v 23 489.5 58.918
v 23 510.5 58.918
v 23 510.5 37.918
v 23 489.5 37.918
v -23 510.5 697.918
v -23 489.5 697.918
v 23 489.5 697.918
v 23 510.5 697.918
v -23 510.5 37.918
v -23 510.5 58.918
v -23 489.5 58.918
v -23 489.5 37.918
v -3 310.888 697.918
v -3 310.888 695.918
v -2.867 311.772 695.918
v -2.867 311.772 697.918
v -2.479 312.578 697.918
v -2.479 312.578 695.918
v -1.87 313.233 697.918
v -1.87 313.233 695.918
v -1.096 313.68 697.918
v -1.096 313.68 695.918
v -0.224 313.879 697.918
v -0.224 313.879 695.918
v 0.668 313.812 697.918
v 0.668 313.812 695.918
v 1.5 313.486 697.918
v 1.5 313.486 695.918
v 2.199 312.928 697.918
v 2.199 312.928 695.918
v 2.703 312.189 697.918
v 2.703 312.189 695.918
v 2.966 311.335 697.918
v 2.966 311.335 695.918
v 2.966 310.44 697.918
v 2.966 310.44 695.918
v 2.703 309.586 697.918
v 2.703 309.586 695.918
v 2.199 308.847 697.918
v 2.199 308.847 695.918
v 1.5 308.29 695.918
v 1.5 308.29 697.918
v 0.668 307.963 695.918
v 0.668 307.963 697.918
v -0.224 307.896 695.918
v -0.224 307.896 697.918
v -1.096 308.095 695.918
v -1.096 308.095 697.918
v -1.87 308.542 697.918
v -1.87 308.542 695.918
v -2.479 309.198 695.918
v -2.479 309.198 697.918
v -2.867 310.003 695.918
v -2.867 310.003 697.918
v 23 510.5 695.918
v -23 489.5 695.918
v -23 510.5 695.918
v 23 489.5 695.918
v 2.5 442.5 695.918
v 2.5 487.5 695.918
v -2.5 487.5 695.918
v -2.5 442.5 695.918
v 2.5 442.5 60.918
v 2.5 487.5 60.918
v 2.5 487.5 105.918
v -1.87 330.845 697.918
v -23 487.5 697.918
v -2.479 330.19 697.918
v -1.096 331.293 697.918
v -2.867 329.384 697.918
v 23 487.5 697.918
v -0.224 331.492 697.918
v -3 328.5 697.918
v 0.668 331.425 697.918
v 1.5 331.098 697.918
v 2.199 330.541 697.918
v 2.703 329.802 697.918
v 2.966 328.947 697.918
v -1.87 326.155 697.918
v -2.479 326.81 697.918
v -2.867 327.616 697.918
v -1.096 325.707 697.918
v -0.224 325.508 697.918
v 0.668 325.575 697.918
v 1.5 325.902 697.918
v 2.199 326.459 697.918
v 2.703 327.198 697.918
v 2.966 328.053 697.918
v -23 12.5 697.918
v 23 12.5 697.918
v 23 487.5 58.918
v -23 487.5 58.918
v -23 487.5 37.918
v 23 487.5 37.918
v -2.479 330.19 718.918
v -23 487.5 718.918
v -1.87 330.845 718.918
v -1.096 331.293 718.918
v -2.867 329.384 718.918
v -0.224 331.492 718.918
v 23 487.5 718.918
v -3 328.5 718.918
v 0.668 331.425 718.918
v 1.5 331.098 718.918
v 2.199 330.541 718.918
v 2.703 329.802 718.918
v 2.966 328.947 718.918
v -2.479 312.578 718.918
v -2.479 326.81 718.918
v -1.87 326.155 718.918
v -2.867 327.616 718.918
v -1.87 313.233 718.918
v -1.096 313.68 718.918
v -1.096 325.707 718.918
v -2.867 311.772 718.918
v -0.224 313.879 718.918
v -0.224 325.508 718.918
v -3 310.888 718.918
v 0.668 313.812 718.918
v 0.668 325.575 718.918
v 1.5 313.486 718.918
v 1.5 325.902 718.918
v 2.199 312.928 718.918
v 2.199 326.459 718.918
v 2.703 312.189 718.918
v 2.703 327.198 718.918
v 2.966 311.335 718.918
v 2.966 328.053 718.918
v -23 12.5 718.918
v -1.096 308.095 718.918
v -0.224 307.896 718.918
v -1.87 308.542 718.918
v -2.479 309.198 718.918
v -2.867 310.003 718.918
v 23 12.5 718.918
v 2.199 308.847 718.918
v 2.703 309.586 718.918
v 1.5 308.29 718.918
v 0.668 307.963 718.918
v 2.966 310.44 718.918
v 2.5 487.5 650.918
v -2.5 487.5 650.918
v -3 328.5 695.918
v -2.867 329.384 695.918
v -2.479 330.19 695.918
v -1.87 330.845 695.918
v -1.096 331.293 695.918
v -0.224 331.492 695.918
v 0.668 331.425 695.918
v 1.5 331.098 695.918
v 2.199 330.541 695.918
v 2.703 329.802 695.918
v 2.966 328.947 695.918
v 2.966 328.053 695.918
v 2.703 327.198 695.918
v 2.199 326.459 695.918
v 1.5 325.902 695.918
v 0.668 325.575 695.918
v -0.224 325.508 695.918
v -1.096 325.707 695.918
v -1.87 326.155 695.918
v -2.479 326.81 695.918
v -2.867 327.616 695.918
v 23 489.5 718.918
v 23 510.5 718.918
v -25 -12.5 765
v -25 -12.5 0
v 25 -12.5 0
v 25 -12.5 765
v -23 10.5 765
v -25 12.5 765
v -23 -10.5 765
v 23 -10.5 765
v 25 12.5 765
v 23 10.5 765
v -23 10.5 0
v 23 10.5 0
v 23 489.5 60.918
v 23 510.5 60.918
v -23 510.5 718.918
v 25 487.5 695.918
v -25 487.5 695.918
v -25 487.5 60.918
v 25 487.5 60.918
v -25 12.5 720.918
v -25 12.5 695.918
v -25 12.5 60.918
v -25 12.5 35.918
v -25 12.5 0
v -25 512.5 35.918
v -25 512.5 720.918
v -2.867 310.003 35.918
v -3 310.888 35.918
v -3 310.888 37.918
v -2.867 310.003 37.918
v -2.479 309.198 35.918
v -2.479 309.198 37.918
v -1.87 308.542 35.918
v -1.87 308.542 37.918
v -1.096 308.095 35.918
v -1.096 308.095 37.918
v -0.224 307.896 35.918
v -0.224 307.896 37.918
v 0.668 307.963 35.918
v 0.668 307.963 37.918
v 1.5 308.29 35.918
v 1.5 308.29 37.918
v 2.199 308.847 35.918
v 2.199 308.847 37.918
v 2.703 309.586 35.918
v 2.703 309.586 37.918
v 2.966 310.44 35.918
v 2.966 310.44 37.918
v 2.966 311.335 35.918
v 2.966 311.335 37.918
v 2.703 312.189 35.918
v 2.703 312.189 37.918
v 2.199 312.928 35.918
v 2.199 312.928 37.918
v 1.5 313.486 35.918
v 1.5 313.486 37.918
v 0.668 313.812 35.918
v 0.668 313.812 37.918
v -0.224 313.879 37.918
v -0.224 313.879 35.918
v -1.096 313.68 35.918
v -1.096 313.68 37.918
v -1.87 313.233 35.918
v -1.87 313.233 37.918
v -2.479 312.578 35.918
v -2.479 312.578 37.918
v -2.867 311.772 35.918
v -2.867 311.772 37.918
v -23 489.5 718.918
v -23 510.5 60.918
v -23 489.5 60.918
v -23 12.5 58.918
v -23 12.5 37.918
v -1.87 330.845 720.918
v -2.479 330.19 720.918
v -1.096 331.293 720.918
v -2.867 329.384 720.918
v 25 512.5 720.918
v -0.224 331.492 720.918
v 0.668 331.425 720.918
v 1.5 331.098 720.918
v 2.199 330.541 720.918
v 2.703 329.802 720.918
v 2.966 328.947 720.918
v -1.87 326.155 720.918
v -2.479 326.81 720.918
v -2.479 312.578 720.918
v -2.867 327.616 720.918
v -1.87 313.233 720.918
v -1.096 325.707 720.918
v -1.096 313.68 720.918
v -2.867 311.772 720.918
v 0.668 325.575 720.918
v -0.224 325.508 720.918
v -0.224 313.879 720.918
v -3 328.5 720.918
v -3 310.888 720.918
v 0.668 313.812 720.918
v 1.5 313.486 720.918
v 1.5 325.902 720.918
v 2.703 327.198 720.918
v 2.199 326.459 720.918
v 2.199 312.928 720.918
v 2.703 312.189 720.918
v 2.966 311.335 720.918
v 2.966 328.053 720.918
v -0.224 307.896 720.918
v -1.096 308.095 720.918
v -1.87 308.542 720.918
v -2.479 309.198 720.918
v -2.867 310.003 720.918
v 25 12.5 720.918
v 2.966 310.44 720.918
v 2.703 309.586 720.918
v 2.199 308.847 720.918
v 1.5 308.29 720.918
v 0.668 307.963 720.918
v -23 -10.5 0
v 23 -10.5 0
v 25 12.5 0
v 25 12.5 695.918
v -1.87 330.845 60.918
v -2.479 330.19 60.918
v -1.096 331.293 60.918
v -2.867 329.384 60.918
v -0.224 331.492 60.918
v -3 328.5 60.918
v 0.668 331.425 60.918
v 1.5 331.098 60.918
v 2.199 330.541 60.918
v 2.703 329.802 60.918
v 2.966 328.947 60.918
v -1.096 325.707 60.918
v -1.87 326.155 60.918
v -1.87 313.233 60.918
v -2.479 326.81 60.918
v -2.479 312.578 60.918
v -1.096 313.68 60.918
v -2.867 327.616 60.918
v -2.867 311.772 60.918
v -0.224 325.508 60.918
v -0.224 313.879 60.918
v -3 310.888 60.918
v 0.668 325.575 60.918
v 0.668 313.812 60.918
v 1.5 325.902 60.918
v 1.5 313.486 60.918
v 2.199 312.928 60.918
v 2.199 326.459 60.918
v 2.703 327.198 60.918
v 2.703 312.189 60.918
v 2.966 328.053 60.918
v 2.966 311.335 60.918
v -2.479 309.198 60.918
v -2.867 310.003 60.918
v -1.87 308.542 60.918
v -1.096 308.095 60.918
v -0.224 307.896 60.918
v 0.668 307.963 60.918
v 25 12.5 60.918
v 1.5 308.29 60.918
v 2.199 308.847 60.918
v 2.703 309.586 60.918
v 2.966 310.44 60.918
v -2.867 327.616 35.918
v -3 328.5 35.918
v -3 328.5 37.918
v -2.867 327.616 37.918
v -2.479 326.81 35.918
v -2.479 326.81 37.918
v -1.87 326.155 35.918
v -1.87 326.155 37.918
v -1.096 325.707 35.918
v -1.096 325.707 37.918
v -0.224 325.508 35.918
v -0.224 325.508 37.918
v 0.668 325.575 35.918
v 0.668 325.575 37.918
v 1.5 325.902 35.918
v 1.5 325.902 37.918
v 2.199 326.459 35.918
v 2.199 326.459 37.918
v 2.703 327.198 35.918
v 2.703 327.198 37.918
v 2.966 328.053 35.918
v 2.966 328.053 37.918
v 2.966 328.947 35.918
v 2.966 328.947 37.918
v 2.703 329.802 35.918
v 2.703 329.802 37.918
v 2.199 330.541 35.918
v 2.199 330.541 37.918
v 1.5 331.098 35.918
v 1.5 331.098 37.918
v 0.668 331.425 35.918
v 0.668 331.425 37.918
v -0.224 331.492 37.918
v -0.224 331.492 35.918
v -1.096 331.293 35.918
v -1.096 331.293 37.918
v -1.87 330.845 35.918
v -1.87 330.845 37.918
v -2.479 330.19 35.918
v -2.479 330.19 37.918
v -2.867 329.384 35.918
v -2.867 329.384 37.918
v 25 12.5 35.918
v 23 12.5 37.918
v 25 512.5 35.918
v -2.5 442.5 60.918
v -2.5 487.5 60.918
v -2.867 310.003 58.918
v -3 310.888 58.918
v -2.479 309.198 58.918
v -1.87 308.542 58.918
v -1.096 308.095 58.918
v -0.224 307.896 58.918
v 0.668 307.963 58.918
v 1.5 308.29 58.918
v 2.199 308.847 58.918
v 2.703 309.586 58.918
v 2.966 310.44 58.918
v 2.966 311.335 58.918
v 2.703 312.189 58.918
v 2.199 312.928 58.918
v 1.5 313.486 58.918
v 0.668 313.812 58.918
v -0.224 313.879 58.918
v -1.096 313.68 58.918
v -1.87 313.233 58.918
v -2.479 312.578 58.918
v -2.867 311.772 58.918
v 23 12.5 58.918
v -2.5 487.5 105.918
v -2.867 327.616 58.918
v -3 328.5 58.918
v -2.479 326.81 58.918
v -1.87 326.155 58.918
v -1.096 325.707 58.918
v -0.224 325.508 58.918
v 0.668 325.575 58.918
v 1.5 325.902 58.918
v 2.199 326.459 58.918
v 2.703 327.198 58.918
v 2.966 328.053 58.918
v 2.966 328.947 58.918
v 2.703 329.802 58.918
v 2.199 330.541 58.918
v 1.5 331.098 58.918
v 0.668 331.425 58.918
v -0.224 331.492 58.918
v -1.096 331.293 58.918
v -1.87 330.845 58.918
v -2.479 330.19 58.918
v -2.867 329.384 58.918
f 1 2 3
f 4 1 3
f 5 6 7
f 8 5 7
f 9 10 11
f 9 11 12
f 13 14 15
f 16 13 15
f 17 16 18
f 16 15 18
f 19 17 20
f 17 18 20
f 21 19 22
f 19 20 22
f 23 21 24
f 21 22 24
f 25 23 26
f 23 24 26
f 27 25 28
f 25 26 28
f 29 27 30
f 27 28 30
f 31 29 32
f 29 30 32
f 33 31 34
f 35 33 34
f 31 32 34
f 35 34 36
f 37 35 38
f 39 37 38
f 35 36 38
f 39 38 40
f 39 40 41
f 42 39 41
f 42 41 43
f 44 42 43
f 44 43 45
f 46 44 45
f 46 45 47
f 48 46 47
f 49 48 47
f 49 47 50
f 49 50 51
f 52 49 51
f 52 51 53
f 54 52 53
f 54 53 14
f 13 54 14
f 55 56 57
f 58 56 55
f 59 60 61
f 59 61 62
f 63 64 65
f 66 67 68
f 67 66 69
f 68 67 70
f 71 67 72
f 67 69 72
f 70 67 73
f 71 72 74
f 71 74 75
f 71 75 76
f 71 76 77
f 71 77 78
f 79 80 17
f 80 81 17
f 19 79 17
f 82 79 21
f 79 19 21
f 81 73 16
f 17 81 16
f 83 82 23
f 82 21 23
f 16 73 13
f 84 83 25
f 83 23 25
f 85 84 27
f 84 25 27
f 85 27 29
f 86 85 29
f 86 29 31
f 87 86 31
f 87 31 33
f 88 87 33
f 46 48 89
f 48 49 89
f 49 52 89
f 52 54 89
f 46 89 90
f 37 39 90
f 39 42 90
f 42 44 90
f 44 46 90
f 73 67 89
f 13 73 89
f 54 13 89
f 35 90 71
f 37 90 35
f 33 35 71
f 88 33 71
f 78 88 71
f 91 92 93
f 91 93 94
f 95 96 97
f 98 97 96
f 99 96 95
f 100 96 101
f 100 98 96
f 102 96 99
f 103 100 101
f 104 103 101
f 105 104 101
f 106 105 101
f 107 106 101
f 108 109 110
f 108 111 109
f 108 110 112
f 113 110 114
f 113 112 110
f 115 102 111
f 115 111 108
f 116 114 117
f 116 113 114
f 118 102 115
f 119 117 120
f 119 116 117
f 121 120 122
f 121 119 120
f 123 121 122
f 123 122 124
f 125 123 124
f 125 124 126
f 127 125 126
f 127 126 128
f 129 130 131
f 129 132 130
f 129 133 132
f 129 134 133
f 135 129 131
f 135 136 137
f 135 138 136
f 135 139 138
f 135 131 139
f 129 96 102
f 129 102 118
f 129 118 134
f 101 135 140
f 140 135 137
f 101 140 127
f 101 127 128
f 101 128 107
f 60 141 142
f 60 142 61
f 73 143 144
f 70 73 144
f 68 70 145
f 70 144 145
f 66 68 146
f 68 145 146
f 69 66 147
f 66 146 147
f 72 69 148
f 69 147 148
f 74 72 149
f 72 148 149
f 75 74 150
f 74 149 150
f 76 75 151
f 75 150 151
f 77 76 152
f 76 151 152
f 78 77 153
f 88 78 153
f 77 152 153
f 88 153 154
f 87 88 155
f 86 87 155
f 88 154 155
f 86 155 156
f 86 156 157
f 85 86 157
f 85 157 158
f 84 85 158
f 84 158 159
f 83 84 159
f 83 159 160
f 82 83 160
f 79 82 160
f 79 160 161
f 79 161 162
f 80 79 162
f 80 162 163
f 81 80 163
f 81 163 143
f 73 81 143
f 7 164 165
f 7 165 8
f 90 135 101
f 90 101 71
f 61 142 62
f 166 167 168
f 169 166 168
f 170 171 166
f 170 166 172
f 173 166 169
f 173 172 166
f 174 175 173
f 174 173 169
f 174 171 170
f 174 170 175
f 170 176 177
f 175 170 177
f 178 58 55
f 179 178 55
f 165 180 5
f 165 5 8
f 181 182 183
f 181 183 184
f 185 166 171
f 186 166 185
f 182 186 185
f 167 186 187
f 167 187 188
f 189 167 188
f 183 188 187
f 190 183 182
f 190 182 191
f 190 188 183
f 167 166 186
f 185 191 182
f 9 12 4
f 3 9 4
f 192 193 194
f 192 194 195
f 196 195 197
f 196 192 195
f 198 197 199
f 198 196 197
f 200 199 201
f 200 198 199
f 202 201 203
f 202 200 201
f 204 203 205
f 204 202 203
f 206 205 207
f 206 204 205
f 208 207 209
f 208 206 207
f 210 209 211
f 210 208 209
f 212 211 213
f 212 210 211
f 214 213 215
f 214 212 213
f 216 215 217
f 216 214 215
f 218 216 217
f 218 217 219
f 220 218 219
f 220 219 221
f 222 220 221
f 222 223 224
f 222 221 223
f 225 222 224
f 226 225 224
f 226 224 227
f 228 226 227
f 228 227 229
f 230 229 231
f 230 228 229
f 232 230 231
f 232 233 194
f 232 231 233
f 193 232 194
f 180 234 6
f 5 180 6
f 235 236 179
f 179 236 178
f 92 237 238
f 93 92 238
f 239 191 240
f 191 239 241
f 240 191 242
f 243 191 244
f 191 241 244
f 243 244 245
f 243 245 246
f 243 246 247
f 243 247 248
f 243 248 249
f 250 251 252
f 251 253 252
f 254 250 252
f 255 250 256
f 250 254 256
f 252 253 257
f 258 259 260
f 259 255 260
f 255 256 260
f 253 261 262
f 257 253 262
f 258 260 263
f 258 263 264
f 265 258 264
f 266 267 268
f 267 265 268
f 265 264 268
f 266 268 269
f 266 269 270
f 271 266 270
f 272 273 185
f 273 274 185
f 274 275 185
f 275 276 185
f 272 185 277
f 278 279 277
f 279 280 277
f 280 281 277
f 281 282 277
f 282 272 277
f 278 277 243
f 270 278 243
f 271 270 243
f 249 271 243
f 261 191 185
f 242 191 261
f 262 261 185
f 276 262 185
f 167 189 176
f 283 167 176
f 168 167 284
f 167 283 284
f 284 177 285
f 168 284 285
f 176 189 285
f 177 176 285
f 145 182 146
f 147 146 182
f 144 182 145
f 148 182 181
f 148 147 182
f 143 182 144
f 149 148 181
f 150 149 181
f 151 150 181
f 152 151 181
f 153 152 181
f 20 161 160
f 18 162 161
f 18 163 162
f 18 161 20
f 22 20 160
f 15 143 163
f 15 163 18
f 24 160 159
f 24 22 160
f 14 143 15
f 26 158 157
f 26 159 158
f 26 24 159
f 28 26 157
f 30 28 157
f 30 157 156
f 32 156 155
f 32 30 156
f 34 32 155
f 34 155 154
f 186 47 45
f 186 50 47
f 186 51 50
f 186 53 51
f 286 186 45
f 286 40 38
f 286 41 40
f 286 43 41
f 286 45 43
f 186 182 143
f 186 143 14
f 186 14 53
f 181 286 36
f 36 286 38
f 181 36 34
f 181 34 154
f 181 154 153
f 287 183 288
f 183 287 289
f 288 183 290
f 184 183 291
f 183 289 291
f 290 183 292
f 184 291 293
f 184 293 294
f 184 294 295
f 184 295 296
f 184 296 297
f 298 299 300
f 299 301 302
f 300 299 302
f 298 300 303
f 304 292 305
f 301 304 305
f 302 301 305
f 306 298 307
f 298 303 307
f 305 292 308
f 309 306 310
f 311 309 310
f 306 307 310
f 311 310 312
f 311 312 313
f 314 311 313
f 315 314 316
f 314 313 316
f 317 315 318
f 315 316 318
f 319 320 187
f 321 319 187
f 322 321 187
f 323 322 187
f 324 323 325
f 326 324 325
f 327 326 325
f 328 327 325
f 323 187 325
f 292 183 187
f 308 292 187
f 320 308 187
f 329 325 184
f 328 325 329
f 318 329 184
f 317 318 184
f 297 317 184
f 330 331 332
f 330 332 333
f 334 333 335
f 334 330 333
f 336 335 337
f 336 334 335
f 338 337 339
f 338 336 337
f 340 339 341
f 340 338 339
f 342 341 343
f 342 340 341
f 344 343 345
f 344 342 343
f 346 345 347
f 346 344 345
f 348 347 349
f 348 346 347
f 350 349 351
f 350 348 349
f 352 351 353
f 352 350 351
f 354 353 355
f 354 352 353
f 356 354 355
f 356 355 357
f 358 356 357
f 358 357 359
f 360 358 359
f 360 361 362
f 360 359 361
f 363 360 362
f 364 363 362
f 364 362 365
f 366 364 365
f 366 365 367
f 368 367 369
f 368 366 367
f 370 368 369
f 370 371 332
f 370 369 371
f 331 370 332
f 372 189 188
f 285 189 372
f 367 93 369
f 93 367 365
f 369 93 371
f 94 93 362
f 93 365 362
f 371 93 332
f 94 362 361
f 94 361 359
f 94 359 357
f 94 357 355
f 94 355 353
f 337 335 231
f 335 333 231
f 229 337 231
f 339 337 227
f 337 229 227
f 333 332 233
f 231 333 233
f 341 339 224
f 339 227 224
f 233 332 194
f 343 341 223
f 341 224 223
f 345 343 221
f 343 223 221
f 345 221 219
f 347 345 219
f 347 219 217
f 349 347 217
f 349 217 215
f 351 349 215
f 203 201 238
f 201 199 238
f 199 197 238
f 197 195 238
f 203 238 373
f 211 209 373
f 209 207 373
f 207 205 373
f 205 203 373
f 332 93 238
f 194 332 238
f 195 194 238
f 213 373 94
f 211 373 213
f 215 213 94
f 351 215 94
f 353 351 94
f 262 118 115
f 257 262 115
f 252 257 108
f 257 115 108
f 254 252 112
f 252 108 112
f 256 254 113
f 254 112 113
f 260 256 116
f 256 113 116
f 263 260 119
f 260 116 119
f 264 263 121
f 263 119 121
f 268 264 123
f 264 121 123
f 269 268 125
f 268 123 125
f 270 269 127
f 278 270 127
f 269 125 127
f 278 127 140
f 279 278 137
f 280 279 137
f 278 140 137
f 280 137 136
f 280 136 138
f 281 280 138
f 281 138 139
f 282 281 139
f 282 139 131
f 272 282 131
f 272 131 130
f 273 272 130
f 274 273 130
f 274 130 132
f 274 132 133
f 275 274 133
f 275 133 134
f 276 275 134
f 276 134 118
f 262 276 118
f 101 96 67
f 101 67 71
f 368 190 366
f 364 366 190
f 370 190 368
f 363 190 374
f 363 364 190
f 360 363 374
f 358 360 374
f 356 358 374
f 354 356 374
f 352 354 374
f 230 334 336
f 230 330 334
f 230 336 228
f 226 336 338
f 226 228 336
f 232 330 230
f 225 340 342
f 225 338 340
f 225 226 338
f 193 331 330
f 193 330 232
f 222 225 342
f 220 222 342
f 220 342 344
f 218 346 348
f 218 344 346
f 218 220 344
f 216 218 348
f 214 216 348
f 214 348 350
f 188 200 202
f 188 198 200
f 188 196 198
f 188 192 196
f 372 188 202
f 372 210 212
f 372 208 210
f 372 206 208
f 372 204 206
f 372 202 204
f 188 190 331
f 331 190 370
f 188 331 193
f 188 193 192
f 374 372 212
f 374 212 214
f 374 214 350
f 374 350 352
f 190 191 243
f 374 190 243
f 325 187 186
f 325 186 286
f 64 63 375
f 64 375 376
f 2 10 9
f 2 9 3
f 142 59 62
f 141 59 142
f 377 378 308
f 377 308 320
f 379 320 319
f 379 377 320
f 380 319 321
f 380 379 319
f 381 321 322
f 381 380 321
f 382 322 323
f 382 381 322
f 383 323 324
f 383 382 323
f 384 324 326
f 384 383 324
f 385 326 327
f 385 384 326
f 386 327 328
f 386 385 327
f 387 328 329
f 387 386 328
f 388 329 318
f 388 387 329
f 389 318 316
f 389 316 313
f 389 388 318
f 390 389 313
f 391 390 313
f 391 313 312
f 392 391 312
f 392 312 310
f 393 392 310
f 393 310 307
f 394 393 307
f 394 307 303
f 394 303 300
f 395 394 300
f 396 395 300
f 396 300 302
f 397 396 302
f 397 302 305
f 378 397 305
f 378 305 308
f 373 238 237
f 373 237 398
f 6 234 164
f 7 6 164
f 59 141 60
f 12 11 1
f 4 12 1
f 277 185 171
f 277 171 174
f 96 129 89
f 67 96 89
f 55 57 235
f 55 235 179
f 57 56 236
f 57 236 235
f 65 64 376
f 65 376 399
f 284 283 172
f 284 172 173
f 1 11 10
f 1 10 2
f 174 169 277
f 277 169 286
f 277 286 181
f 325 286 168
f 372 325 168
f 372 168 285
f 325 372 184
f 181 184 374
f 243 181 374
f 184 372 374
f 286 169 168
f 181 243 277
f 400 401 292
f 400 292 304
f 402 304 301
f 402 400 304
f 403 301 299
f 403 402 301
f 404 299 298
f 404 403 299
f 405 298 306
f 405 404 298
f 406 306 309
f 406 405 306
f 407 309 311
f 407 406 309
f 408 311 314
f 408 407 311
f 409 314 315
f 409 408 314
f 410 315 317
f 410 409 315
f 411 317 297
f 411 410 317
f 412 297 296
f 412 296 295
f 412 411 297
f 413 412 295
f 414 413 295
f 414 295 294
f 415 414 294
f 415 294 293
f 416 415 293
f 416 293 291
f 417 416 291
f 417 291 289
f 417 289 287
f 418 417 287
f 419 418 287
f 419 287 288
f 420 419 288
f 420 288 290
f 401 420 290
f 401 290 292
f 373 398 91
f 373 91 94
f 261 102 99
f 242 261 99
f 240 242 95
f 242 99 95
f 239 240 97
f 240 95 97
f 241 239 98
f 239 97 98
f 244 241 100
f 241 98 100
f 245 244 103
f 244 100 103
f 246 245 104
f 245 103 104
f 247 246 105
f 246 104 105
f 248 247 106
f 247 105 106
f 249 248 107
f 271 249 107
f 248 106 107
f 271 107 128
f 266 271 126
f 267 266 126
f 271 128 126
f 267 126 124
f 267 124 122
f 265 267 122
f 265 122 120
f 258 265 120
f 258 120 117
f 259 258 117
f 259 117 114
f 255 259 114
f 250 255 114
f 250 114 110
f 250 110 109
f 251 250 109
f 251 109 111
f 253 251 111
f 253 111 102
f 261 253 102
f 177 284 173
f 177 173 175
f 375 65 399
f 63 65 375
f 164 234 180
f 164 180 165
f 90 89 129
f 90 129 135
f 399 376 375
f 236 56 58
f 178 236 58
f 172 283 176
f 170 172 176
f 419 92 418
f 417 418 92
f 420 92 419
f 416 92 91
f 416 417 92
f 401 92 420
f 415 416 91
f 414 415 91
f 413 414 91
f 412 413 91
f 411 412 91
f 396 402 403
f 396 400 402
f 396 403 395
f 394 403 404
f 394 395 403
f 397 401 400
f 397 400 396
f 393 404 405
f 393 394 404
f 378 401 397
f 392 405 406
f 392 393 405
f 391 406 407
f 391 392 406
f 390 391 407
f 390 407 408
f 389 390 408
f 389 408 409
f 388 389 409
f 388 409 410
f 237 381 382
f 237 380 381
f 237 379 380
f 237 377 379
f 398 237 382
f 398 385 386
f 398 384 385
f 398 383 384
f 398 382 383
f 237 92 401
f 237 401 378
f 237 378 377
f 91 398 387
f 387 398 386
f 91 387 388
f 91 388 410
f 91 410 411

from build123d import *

# Parameters (mm, degrees)
SKETCH1_W           = 50
SKETCH1_H           = 25
SKETCH1_W_2         = 46
SKETCH1_H_2         = 21
BOSS_EXTRUDE1_DEPTH = 765
SKETCH2_W           = 50
SKETCH2_H           = 25
SKETCH2_W_2         = 46
SKETCH2_H_2         = 21
BOSS_EXTRUDE2_DEPTH = 500
BOSS_EXTRUDE3_REACH = 886.875
SKETCH3_W           = 50
SKETCH3_H           = 25
SKETCH3_W_2         = 46
SKETCH3_H_2         = 21
GUSSET1_THICKNESS   = 5
GUSSET2_THICKNESS   = 5
SKETCH9_R           = 3
CUT_EXTRUDE1_DEPTH  = 70
CUT_EXTRUDE2_START  = -70
SKETCH10_R          = 3
CUT_EXTRUDE2_DEPTH  = 70


with BuildPart() as part:
    # Sketch1 → Boss-Extrude1 (new body)
    with BuildSketch(Plane.XY):
        Rectangle(SKETCH1_W, SKETCH1_H)
        Rectangle(SKETCH1_W_2, SKETCH1_H_2, mode=Mode.SUBTRACT)
    extrude(amount=BOSS_EXTRUDE1_DEPTH)

    # Sketch2 → Boss-Extrude2 (add)
    # profile 1 of 2: a face of its own
    with BuildSketch(Plane(origin=(0, 12.5, 0), x_dir=(1, 0, 0), z_dir=(0, 1, 0))):
        with Locations((0, -708.418350439)):
            Rectangle(SKETCH2_W, SKETCH2_H)
        with Locations((0, -708.418350439)):
            Rectangle(SKETCH2_W_2, SKETCH2_H_2, mode=Mode.SUBTRACT)
    # profile 2 of 2: a face of its own
    with BuildSketch(Plane(origin=(0, 12.5, 0), x_dir=(1, 0, 0), z_dir=(0, 1, 0))):
        with Locations((0, -48.418350439)):
            Rectangle(SKETCH2_W, SKETCH2_H)
        with Locations((0, -48.418350439)):
            Rectangle(SKETCH2_W_2, SKETCH2_H_2, mode=Mode.SUBTRACT)
    extrude(amount=BOSS_EXTRUDE2_DEPTH)

    # Boss-Extrude3: up to this face of the body (flat: up to its plane)
    boss_extrude3_end = Plane(part.part.faces().sort_by_distance((0, 262.5, 35.918350439))[0])
    # Sketch3 → Boss-Extrude3 (add, up to the picked face)
    with BuildSketch(Plane.XY.offset(720.918350439), mode=Mode.PRIVATE) as boss_extrude3_sk1:
        with Locations((0, 500)):
            Rectangle(SKETCH3_W, SKETCH3_H)
        with Locations((0, 500)):
            Rectangle(SKETCH3_W_2, SKETCH3_H_2, mode=Mode.SUBTRACT)
    boss_extrude3_tool1 = split(extrude(boss_extrude3_sk1.sketch, amount=-BOSS_EXTRUDE3_REACH, mode=Mode.PRIVATE), bisect_by=boss_extrude3_end, keep=Keep.BOTH, mode=Mode.PRIVATE)
    add(boss_extrude3_tool1.solids().sort_by(Axis((0, 488.059017, 720.91835), (0, 0, -1)))[0])

    # Sketch9 → Cut-Extrude1 (cut)
    with BuildSketch(Plane(origin=(0, 0, 695.918350439), x_dir=(-1, 0, 0), z_dir=(0, 0, -1))):
        with Locations((0, 310.887616871)):
            Circle(SKETCH9_R)
        with Locations((0, 328.5)):
            Circle(SKETCH9_R)
    extrude(amount=-CUT_EXTRUDE1_DEPTH, mode=Mode.SUBTRACT)

    # Sketch10 → Cut-Extrude2 (cut)
    with BuildSketch(Plane.XY.offset(60.918350439).offset(CUT_EXTRUDE2_START)):
        with Locations(Location((0, 310.887616871, 0), (0, 0, 180))):
            Circle(SKETCH10_R)
        with Locations(Location((0, 328.5, 0), (0, 0, 180))):
            Circle(SKETCH10_R)
    extrude(amount=CUT_EXTRUDE2_DEPTH, mode=Mode.SUBTRACT)


with BuildPart() as body_2:
    # Gusset1: a gusset: a plate 5.0 thick in the corner of two members, its outline drawn in place
    gusset1_outline = Wire([Line((2.5, 487.5, 60.918350439), (2.5, 487.5, 105.918350439)), Line((2.5, 487.5, 105.918350439), (2.5, 442.5, 60.918350439)), Line((2.5, 442.5, 60.918350439), (2.5, 487.5, 60.918350439))])
    add(extrude(Face(gusset1_outline), amount=GUSSET1_THICKNESS, dir=(-1, 0, 0)))


with BuildPart() as body_3:
    # Gusset2: a gusset: a plate 5.0 thick in the corner of two members, its outline drawn in place
    gusset2_outline = Wire([Line((2.5, 487.5, 695.918350439), (2.5, 442.5, 695.918350439)), Line((2.5, 442.5, 695.918350439), (2.5, 487.5, 650.918350439)), Line((2.5, 487.5, 650.918350439), (2.5, 487.5, 695.918350439))])
    add(extrude(Face(gusset2_outline), amount=GUSSET2_THICKNESS, dir=(-1, 0, 0)))


solid = Compound([part.part, body_2.part, body_3.part])
